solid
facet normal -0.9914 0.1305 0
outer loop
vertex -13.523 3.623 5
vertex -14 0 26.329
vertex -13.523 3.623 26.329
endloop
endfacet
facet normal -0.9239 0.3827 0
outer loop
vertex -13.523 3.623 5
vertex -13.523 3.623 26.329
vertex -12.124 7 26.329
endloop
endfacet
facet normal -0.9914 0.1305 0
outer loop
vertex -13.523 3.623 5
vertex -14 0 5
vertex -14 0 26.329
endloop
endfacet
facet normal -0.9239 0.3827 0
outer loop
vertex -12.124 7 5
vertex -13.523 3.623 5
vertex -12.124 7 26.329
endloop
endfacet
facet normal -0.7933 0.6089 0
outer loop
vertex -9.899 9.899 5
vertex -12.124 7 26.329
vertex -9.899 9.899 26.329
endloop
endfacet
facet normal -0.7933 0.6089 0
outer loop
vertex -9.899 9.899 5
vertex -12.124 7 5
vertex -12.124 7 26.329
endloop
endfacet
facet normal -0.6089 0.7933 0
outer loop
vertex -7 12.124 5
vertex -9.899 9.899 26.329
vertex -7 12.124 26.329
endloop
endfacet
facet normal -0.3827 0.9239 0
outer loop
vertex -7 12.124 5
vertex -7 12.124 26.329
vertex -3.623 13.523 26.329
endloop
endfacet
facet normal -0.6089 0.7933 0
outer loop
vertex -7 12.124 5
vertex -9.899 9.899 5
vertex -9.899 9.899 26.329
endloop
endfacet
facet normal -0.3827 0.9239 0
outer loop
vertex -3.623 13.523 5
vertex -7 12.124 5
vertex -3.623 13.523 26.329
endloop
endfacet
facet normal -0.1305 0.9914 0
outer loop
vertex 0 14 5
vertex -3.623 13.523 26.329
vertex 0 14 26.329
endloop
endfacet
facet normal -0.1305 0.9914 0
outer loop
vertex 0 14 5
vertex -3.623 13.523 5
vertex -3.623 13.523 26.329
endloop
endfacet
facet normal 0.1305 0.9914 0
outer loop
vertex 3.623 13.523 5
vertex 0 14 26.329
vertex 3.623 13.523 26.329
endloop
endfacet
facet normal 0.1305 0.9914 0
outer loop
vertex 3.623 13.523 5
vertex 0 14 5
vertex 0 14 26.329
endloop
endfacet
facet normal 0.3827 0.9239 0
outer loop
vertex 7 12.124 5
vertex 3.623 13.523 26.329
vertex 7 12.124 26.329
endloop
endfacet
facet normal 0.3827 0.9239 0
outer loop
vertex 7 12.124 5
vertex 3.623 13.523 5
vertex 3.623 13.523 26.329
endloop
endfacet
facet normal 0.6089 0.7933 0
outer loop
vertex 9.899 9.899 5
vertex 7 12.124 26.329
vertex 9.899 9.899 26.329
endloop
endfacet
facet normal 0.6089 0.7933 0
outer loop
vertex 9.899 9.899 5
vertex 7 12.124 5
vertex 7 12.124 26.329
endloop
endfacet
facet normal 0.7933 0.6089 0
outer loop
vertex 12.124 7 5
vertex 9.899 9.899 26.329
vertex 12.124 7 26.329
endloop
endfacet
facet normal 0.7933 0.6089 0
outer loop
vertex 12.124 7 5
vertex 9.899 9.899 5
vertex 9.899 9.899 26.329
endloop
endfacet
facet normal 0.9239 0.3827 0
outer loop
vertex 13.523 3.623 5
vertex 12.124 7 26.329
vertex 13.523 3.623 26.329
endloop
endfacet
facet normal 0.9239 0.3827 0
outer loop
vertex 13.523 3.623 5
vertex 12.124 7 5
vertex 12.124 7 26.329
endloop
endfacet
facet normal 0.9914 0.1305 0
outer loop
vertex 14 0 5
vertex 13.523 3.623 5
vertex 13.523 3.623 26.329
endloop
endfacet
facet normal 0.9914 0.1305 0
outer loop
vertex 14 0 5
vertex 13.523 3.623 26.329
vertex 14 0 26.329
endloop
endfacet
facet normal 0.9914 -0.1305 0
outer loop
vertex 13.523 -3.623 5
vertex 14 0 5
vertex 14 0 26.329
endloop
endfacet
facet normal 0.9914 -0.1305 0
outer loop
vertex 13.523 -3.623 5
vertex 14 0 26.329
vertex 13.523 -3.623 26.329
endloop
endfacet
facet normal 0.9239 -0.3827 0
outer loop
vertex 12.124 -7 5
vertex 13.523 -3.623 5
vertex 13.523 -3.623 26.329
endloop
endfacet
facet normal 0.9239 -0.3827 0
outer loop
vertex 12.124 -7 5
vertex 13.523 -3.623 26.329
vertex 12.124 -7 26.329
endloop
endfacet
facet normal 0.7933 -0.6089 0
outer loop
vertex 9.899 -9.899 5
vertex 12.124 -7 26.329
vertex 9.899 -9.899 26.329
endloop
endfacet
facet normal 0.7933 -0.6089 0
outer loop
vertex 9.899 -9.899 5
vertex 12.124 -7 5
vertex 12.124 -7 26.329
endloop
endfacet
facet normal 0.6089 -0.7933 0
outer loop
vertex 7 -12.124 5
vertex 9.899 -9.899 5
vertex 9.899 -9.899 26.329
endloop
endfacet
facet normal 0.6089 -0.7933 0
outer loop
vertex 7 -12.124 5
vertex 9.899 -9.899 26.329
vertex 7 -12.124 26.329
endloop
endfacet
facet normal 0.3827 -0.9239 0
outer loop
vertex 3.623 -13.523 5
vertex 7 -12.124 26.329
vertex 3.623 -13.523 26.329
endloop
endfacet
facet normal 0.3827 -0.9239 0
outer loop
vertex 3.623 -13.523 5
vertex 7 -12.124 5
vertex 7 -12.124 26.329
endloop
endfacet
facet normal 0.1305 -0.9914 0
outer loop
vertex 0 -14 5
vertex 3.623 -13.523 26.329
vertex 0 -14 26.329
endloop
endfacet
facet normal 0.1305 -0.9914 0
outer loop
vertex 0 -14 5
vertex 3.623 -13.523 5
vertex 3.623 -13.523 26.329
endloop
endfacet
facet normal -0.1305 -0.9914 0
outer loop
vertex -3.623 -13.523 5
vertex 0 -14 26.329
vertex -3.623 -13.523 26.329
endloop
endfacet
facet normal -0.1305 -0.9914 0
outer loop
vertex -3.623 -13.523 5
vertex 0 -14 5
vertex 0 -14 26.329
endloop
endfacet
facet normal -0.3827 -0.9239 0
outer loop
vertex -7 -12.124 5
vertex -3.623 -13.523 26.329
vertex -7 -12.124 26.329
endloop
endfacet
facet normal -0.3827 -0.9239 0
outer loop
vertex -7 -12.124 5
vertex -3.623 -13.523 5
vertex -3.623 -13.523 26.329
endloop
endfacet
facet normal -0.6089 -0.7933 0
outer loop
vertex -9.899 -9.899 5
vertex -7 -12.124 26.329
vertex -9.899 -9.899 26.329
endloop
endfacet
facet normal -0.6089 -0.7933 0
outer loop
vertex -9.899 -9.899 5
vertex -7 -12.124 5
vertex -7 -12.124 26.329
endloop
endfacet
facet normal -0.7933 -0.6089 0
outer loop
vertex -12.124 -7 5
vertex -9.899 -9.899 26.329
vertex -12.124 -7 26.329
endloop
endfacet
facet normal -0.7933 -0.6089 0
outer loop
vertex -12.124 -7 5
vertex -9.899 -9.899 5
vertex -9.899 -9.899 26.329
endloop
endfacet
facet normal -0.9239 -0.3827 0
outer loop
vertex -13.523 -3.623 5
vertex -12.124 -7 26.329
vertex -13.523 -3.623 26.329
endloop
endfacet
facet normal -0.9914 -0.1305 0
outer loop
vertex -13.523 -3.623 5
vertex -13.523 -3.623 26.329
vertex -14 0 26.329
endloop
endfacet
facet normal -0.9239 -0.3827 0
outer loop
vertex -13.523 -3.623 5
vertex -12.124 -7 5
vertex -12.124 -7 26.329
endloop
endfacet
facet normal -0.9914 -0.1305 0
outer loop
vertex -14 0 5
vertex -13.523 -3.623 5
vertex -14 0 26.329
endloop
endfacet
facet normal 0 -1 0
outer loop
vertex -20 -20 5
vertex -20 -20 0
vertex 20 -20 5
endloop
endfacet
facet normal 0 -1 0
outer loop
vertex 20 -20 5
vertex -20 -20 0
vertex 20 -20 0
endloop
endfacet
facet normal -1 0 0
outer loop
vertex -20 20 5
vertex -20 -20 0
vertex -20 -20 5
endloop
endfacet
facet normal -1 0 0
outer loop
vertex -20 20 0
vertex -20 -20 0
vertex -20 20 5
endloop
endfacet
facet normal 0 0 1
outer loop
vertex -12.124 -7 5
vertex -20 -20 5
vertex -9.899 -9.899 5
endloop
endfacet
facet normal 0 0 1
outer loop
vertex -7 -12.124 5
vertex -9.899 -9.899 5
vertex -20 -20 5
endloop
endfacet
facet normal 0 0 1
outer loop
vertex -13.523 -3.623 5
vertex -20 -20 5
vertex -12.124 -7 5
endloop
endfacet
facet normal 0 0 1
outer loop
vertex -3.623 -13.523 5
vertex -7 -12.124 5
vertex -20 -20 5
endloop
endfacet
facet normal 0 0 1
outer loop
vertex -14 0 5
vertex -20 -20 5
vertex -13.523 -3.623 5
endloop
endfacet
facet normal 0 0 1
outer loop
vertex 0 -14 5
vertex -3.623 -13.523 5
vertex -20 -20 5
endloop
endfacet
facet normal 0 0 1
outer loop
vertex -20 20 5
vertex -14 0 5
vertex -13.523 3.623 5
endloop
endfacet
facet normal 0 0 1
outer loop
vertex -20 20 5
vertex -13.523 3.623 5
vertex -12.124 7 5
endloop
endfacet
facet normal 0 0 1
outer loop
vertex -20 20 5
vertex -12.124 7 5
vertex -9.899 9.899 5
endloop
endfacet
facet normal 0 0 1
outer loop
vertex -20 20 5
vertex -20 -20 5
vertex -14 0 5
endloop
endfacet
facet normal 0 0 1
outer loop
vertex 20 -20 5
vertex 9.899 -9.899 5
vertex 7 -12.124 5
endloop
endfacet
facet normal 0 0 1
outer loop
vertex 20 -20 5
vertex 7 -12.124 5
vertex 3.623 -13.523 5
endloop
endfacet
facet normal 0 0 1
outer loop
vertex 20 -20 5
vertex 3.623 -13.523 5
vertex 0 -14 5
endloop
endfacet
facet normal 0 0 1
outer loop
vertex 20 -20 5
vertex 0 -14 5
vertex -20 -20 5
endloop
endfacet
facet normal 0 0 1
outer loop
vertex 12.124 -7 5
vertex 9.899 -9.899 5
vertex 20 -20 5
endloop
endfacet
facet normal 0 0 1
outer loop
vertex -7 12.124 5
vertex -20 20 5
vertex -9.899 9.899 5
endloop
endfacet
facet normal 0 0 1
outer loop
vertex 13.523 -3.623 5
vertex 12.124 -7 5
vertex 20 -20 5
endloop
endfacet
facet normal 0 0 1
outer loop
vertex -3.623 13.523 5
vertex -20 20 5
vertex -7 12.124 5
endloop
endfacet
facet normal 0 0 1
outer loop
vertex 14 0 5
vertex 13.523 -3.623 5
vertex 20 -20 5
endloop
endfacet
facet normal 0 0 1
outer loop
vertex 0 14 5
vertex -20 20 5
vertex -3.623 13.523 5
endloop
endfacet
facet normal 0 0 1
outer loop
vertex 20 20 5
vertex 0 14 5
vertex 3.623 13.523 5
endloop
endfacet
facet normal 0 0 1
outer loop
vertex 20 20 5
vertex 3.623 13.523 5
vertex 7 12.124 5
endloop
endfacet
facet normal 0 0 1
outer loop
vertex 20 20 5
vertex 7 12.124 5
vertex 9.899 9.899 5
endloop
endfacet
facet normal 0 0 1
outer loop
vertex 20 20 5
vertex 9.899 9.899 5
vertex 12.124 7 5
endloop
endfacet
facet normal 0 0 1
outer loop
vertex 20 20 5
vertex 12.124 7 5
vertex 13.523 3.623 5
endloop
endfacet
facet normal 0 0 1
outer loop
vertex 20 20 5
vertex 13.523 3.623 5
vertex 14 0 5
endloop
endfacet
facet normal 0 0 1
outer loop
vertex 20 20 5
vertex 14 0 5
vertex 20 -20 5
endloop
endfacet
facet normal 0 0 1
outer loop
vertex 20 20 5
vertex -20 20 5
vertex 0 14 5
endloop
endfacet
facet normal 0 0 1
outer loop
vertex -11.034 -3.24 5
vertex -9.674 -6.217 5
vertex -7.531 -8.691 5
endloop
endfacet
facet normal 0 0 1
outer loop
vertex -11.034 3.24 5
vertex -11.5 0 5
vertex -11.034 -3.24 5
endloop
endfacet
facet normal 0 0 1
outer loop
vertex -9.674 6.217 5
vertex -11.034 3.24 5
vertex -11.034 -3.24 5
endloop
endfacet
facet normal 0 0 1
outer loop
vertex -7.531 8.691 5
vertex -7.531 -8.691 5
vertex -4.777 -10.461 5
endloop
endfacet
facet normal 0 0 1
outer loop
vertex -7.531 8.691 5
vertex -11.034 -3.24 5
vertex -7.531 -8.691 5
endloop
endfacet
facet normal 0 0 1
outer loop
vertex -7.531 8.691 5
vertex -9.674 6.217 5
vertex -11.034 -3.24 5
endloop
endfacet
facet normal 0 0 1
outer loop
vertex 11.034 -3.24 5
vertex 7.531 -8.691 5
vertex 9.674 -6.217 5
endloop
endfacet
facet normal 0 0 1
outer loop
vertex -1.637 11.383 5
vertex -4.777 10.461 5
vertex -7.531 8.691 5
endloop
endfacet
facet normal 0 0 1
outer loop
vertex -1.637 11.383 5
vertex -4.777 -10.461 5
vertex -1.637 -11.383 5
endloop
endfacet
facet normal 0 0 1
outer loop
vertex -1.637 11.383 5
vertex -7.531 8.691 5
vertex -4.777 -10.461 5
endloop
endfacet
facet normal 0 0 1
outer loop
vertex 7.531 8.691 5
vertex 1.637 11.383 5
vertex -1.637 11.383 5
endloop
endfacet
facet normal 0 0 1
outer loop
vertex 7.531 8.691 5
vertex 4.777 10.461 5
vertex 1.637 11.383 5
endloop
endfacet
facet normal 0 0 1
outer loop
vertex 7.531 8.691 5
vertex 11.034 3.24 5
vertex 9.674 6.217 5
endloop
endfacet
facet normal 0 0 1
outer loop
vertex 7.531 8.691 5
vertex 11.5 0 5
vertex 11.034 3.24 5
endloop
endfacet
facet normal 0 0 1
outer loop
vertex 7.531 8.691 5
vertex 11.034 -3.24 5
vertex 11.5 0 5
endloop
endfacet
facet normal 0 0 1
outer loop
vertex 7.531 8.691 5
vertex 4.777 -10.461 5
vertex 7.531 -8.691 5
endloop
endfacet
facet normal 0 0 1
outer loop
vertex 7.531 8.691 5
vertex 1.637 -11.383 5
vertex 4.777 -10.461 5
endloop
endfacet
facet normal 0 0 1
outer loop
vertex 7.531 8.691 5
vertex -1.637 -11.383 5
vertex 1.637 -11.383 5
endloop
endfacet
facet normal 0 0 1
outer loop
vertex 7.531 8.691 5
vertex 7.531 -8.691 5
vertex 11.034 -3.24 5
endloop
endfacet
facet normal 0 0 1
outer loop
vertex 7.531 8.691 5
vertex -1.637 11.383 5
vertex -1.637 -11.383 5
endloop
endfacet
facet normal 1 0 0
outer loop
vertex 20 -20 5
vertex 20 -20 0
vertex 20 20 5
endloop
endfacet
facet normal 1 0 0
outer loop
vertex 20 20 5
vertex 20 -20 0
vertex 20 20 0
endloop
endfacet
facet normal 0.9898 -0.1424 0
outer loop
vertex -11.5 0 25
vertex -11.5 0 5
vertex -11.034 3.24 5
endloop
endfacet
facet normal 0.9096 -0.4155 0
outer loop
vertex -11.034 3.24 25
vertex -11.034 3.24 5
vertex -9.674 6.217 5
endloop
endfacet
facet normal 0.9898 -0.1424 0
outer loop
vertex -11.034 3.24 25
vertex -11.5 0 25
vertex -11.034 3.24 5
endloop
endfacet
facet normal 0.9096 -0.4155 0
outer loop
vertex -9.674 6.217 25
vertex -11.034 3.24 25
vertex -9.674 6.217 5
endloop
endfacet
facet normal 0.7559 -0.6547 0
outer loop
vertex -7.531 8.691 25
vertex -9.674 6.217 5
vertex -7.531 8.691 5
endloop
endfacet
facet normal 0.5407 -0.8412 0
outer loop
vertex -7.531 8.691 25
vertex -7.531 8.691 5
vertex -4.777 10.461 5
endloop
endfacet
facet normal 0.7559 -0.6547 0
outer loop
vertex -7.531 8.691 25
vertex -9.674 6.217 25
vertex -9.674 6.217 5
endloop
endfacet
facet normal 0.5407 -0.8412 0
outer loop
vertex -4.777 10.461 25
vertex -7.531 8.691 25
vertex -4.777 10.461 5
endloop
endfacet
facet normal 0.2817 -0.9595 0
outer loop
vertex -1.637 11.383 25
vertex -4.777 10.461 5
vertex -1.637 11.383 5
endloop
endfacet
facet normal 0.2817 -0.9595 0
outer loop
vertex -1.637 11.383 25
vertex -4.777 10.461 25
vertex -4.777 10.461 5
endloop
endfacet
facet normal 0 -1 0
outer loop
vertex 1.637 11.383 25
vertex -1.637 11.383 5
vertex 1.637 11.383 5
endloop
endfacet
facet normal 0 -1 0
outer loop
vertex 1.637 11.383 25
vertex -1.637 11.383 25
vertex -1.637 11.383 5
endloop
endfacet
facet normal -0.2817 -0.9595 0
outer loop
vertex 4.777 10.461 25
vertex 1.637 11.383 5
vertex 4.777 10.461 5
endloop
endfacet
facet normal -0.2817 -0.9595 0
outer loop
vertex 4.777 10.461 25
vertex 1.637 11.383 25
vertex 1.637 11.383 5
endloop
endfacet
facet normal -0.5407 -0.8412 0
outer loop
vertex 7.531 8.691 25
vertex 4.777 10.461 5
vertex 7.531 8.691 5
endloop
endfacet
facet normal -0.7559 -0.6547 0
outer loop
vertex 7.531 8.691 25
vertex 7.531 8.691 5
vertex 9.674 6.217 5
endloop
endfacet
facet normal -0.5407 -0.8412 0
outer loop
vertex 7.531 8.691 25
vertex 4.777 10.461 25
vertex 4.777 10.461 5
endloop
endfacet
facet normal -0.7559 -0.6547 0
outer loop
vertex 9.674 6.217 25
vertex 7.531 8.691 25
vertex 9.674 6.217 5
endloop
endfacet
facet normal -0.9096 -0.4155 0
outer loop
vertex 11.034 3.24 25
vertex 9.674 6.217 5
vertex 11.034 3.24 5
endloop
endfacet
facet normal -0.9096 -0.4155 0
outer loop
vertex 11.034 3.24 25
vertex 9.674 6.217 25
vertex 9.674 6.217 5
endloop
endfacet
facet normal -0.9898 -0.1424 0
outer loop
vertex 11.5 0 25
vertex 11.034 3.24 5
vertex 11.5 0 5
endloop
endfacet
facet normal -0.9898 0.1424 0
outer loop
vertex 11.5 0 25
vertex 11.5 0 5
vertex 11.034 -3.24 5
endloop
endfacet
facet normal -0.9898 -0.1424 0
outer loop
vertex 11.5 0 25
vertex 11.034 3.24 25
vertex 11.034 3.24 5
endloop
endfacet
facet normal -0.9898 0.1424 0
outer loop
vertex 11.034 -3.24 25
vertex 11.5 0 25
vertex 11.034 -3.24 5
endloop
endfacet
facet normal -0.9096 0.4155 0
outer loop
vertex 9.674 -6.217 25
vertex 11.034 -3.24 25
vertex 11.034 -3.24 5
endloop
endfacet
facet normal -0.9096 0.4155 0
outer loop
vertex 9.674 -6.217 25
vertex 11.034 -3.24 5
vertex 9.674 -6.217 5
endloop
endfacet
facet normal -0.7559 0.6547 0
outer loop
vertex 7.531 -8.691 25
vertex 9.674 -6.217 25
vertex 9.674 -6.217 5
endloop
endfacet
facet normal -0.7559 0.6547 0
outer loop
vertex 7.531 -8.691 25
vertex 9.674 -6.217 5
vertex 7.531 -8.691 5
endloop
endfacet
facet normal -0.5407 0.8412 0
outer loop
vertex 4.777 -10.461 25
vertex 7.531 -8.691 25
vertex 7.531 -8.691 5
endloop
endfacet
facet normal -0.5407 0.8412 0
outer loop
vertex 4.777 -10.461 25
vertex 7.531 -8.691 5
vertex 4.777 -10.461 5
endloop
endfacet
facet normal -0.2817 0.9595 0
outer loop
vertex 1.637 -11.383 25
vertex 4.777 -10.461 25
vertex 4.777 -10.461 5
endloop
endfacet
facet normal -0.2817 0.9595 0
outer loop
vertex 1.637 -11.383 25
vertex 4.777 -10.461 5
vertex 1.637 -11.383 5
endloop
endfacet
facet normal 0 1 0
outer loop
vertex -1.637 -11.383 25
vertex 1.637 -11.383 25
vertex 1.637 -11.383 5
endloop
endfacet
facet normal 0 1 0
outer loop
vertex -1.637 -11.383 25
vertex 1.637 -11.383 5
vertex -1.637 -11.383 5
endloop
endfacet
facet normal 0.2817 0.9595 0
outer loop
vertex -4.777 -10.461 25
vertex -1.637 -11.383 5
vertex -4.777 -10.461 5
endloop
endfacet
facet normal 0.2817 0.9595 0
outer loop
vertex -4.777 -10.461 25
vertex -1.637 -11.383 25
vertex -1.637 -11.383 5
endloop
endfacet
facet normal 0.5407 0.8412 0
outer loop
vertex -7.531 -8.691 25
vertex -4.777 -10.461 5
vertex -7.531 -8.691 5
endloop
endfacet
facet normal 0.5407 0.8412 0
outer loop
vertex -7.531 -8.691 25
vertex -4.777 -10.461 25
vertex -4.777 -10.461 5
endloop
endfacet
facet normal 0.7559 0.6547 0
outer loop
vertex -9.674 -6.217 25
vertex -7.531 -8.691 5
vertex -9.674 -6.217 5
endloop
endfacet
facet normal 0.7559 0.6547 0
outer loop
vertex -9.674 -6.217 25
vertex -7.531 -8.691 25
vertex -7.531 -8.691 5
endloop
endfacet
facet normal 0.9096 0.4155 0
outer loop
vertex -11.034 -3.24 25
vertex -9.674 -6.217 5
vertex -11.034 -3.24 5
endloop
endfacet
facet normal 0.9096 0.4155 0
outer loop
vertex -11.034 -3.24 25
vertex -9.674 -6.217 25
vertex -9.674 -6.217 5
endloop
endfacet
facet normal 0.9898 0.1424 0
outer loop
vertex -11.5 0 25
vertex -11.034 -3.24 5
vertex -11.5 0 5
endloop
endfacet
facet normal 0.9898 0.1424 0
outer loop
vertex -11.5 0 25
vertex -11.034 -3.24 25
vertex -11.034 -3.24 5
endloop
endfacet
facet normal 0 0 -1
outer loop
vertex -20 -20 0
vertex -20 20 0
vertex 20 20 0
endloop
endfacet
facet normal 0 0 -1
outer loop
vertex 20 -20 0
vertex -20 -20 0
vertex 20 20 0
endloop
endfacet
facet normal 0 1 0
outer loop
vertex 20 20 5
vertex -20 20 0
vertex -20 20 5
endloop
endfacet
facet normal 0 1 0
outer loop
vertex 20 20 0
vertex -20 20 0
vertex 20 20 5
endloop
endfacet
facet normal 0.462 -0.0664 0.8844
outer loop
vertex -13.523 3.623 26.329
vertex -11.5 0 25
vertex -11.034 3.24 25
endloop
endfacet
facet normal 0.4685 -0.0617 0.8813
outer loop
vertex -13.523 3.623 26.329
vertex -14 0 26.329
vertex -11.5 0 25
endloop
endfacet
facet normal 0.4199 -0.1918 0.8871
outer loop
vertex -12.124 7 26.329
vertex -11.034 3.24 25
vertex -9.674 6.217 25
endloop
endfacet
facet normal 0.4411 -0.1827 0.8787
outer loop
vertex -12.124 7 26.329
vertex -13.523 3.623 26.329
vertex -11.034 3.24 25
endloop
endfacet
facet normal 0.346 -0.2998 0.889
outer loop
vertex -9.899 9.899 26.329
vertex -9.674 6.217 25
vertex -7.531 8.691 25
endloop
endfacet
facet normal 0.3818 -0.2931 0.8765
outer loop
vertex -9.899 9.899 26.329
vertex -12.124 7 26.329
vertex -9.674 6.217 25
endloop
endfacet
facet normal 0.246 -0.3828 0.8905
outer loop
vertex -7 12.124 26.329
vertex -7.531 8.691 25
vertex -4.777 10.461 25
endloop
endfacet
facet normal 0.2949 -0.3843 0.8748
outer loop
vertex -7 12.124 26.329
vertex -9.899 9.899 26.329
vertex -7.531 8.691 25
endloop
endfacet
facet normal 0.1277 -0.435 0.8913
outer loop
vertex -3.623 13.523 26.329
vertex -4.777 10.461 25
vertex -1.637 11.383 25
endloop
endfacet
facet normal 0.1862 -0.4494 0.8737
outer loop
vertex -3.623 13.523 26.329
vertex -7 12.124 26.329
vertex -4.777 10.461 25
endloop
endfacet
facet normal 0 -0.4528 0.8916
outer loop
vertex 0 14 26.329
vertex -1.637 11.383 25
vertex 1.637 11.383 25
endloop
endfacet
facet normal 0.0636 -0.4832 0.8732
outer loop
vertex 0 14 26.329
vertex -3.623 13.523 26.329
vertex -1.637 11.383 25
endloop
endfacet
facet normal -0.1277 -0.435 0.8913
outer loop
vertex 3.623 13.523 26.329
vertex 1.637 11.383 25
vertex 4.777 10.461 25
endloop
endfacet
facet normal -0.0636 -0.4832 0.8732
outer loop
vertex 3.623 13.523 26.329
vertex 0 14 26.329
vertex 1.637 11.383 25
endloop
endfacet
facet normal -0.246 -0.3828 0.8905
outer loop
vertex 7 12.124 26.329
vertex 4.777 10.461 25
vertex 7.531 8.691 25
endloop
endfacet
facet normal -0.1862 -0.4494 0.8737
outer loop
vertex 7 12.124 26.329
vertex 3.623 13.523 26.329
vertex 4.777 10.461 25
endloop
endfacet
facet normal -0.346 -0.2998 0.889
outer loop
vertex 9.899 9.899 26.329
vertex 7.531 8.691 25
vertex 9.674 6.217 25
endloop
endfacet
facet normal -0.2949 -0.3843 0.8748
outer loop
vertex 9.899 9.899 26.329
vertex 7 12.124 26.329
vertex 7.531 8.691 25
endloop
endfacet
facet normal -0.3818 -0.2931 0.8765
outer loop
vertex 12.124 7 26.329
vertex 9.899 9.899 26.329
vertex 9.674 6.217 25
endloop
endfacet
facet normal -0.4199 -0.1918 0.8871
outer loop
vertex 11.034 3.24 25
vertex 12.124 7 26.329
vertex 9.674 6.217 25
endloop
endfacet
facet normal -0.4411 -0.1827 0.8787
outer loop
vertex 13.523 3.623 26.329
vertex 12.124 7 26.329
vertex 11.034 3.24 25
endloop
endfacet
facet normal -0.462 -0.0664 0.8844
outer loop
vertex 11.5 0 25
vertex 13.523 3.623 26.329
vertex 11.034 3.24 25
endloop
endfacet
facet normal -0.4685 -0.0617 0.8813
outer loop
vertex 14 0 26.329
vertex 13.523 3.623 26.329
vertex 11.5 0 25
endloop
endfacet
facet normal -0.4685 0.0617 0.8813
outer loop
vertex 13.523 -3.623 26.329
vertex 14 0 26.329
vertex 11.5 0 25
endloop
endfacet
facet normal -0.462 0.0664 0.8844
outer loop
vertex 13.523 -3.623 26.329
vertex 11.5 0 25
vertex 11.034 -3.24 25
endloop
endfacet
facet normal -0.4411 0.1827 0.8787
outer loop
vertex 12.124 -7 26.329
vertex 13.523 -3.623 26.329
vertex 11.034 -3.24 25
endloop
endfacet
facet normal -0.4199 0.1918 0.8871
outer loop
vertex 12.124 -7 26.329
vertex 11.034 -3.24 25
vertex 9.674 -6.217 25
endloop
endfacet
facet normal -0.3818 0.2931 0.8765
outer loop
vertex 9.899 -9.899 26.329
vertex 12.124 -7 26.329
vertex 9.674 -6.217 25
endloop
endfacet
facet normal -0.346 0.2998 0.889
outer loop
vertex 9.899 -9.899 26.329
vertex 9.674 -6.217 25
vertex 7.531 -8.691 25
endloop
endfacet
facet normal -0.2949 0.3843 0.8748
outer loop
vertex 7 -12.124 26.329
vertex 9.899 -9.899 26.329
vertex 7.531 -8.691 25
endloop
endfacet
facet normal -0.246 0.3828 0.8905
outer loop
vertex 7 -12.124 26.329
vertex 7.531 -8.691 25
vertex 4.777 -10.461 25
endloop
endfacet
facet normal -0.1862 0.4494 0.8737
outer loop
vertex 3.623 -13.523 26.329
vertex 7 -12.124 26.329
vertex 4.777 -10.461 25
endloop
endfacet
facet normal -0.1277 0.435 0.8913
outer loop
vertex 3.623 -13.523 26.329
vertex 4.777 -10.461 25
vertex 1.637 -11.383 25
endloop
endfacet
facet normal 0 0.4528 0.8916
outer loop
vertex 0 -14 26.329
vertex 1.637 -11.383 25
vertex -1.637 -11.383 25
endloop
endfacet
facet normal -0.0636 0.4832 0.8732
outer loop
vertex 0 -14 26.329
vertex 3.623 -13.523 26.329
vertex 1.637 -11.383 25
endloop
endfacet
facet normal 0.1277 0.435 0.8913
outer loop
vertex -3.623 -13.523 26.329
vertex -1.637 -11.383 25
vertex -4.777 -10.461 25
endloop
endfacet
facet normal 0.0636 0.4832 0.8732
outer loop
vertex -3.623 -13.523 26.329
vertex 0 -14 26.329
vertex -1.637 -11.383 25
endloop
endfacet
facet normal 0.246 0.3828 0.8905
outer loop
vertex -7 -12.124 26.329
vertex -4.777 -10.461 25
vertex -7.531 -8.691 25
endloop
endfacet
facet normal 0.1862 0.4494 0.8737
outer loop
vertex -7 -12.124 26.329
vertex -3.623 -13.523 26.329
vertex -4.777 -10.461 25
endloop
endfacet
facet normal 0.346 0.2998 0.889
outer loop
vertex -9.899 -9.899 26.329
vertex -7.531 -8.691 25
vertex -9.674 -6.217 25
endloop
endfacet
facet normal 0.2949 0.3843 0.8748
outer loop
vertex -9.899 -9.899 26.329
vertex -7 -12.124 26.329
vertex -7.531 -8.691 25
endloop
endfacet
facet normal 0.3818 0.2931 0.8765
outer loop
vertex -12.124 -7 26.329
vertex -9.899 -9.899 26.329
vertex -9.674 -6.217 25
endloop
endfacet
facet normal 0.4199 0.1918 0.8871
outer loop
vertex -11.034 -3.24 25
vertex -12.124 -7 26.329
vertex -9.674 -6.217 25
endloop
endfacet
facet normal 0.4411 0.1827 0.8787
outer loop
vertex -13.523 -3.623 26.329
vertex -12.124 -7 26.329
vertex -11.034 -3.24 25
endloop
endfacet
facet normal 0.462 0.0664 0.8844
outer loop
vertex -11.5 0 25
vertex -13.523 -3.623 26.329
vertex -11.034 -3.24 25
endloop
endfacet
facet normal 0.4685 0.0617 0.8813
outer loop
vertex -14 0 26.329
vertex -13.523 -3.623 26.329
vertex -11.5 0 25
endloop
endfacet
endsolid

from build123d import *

# Parameters (mm, degrees)
F0_W     = 40
F0_H     = 40
F1_DEPTH = 5


with BuildPart() as f1:
    # F0 (on Top) → F1 (new body)
    with BuildSketch(Plane.XY):
        Rectangle(F0_W, F0_H)
    extrude(amount=F1_DEPTH)

    # F2 (on Front) → F3 (revolve)
    with BuildSketch(Plane.XZ):
        Polygon((-14, 26.329274), (-14, 5), (-11.5, 5), (-11.5, 25), align=None)
    revolve(axis=Axis((0, 0, 17.722977), (0, 0, -1)))


solid = f1.part
